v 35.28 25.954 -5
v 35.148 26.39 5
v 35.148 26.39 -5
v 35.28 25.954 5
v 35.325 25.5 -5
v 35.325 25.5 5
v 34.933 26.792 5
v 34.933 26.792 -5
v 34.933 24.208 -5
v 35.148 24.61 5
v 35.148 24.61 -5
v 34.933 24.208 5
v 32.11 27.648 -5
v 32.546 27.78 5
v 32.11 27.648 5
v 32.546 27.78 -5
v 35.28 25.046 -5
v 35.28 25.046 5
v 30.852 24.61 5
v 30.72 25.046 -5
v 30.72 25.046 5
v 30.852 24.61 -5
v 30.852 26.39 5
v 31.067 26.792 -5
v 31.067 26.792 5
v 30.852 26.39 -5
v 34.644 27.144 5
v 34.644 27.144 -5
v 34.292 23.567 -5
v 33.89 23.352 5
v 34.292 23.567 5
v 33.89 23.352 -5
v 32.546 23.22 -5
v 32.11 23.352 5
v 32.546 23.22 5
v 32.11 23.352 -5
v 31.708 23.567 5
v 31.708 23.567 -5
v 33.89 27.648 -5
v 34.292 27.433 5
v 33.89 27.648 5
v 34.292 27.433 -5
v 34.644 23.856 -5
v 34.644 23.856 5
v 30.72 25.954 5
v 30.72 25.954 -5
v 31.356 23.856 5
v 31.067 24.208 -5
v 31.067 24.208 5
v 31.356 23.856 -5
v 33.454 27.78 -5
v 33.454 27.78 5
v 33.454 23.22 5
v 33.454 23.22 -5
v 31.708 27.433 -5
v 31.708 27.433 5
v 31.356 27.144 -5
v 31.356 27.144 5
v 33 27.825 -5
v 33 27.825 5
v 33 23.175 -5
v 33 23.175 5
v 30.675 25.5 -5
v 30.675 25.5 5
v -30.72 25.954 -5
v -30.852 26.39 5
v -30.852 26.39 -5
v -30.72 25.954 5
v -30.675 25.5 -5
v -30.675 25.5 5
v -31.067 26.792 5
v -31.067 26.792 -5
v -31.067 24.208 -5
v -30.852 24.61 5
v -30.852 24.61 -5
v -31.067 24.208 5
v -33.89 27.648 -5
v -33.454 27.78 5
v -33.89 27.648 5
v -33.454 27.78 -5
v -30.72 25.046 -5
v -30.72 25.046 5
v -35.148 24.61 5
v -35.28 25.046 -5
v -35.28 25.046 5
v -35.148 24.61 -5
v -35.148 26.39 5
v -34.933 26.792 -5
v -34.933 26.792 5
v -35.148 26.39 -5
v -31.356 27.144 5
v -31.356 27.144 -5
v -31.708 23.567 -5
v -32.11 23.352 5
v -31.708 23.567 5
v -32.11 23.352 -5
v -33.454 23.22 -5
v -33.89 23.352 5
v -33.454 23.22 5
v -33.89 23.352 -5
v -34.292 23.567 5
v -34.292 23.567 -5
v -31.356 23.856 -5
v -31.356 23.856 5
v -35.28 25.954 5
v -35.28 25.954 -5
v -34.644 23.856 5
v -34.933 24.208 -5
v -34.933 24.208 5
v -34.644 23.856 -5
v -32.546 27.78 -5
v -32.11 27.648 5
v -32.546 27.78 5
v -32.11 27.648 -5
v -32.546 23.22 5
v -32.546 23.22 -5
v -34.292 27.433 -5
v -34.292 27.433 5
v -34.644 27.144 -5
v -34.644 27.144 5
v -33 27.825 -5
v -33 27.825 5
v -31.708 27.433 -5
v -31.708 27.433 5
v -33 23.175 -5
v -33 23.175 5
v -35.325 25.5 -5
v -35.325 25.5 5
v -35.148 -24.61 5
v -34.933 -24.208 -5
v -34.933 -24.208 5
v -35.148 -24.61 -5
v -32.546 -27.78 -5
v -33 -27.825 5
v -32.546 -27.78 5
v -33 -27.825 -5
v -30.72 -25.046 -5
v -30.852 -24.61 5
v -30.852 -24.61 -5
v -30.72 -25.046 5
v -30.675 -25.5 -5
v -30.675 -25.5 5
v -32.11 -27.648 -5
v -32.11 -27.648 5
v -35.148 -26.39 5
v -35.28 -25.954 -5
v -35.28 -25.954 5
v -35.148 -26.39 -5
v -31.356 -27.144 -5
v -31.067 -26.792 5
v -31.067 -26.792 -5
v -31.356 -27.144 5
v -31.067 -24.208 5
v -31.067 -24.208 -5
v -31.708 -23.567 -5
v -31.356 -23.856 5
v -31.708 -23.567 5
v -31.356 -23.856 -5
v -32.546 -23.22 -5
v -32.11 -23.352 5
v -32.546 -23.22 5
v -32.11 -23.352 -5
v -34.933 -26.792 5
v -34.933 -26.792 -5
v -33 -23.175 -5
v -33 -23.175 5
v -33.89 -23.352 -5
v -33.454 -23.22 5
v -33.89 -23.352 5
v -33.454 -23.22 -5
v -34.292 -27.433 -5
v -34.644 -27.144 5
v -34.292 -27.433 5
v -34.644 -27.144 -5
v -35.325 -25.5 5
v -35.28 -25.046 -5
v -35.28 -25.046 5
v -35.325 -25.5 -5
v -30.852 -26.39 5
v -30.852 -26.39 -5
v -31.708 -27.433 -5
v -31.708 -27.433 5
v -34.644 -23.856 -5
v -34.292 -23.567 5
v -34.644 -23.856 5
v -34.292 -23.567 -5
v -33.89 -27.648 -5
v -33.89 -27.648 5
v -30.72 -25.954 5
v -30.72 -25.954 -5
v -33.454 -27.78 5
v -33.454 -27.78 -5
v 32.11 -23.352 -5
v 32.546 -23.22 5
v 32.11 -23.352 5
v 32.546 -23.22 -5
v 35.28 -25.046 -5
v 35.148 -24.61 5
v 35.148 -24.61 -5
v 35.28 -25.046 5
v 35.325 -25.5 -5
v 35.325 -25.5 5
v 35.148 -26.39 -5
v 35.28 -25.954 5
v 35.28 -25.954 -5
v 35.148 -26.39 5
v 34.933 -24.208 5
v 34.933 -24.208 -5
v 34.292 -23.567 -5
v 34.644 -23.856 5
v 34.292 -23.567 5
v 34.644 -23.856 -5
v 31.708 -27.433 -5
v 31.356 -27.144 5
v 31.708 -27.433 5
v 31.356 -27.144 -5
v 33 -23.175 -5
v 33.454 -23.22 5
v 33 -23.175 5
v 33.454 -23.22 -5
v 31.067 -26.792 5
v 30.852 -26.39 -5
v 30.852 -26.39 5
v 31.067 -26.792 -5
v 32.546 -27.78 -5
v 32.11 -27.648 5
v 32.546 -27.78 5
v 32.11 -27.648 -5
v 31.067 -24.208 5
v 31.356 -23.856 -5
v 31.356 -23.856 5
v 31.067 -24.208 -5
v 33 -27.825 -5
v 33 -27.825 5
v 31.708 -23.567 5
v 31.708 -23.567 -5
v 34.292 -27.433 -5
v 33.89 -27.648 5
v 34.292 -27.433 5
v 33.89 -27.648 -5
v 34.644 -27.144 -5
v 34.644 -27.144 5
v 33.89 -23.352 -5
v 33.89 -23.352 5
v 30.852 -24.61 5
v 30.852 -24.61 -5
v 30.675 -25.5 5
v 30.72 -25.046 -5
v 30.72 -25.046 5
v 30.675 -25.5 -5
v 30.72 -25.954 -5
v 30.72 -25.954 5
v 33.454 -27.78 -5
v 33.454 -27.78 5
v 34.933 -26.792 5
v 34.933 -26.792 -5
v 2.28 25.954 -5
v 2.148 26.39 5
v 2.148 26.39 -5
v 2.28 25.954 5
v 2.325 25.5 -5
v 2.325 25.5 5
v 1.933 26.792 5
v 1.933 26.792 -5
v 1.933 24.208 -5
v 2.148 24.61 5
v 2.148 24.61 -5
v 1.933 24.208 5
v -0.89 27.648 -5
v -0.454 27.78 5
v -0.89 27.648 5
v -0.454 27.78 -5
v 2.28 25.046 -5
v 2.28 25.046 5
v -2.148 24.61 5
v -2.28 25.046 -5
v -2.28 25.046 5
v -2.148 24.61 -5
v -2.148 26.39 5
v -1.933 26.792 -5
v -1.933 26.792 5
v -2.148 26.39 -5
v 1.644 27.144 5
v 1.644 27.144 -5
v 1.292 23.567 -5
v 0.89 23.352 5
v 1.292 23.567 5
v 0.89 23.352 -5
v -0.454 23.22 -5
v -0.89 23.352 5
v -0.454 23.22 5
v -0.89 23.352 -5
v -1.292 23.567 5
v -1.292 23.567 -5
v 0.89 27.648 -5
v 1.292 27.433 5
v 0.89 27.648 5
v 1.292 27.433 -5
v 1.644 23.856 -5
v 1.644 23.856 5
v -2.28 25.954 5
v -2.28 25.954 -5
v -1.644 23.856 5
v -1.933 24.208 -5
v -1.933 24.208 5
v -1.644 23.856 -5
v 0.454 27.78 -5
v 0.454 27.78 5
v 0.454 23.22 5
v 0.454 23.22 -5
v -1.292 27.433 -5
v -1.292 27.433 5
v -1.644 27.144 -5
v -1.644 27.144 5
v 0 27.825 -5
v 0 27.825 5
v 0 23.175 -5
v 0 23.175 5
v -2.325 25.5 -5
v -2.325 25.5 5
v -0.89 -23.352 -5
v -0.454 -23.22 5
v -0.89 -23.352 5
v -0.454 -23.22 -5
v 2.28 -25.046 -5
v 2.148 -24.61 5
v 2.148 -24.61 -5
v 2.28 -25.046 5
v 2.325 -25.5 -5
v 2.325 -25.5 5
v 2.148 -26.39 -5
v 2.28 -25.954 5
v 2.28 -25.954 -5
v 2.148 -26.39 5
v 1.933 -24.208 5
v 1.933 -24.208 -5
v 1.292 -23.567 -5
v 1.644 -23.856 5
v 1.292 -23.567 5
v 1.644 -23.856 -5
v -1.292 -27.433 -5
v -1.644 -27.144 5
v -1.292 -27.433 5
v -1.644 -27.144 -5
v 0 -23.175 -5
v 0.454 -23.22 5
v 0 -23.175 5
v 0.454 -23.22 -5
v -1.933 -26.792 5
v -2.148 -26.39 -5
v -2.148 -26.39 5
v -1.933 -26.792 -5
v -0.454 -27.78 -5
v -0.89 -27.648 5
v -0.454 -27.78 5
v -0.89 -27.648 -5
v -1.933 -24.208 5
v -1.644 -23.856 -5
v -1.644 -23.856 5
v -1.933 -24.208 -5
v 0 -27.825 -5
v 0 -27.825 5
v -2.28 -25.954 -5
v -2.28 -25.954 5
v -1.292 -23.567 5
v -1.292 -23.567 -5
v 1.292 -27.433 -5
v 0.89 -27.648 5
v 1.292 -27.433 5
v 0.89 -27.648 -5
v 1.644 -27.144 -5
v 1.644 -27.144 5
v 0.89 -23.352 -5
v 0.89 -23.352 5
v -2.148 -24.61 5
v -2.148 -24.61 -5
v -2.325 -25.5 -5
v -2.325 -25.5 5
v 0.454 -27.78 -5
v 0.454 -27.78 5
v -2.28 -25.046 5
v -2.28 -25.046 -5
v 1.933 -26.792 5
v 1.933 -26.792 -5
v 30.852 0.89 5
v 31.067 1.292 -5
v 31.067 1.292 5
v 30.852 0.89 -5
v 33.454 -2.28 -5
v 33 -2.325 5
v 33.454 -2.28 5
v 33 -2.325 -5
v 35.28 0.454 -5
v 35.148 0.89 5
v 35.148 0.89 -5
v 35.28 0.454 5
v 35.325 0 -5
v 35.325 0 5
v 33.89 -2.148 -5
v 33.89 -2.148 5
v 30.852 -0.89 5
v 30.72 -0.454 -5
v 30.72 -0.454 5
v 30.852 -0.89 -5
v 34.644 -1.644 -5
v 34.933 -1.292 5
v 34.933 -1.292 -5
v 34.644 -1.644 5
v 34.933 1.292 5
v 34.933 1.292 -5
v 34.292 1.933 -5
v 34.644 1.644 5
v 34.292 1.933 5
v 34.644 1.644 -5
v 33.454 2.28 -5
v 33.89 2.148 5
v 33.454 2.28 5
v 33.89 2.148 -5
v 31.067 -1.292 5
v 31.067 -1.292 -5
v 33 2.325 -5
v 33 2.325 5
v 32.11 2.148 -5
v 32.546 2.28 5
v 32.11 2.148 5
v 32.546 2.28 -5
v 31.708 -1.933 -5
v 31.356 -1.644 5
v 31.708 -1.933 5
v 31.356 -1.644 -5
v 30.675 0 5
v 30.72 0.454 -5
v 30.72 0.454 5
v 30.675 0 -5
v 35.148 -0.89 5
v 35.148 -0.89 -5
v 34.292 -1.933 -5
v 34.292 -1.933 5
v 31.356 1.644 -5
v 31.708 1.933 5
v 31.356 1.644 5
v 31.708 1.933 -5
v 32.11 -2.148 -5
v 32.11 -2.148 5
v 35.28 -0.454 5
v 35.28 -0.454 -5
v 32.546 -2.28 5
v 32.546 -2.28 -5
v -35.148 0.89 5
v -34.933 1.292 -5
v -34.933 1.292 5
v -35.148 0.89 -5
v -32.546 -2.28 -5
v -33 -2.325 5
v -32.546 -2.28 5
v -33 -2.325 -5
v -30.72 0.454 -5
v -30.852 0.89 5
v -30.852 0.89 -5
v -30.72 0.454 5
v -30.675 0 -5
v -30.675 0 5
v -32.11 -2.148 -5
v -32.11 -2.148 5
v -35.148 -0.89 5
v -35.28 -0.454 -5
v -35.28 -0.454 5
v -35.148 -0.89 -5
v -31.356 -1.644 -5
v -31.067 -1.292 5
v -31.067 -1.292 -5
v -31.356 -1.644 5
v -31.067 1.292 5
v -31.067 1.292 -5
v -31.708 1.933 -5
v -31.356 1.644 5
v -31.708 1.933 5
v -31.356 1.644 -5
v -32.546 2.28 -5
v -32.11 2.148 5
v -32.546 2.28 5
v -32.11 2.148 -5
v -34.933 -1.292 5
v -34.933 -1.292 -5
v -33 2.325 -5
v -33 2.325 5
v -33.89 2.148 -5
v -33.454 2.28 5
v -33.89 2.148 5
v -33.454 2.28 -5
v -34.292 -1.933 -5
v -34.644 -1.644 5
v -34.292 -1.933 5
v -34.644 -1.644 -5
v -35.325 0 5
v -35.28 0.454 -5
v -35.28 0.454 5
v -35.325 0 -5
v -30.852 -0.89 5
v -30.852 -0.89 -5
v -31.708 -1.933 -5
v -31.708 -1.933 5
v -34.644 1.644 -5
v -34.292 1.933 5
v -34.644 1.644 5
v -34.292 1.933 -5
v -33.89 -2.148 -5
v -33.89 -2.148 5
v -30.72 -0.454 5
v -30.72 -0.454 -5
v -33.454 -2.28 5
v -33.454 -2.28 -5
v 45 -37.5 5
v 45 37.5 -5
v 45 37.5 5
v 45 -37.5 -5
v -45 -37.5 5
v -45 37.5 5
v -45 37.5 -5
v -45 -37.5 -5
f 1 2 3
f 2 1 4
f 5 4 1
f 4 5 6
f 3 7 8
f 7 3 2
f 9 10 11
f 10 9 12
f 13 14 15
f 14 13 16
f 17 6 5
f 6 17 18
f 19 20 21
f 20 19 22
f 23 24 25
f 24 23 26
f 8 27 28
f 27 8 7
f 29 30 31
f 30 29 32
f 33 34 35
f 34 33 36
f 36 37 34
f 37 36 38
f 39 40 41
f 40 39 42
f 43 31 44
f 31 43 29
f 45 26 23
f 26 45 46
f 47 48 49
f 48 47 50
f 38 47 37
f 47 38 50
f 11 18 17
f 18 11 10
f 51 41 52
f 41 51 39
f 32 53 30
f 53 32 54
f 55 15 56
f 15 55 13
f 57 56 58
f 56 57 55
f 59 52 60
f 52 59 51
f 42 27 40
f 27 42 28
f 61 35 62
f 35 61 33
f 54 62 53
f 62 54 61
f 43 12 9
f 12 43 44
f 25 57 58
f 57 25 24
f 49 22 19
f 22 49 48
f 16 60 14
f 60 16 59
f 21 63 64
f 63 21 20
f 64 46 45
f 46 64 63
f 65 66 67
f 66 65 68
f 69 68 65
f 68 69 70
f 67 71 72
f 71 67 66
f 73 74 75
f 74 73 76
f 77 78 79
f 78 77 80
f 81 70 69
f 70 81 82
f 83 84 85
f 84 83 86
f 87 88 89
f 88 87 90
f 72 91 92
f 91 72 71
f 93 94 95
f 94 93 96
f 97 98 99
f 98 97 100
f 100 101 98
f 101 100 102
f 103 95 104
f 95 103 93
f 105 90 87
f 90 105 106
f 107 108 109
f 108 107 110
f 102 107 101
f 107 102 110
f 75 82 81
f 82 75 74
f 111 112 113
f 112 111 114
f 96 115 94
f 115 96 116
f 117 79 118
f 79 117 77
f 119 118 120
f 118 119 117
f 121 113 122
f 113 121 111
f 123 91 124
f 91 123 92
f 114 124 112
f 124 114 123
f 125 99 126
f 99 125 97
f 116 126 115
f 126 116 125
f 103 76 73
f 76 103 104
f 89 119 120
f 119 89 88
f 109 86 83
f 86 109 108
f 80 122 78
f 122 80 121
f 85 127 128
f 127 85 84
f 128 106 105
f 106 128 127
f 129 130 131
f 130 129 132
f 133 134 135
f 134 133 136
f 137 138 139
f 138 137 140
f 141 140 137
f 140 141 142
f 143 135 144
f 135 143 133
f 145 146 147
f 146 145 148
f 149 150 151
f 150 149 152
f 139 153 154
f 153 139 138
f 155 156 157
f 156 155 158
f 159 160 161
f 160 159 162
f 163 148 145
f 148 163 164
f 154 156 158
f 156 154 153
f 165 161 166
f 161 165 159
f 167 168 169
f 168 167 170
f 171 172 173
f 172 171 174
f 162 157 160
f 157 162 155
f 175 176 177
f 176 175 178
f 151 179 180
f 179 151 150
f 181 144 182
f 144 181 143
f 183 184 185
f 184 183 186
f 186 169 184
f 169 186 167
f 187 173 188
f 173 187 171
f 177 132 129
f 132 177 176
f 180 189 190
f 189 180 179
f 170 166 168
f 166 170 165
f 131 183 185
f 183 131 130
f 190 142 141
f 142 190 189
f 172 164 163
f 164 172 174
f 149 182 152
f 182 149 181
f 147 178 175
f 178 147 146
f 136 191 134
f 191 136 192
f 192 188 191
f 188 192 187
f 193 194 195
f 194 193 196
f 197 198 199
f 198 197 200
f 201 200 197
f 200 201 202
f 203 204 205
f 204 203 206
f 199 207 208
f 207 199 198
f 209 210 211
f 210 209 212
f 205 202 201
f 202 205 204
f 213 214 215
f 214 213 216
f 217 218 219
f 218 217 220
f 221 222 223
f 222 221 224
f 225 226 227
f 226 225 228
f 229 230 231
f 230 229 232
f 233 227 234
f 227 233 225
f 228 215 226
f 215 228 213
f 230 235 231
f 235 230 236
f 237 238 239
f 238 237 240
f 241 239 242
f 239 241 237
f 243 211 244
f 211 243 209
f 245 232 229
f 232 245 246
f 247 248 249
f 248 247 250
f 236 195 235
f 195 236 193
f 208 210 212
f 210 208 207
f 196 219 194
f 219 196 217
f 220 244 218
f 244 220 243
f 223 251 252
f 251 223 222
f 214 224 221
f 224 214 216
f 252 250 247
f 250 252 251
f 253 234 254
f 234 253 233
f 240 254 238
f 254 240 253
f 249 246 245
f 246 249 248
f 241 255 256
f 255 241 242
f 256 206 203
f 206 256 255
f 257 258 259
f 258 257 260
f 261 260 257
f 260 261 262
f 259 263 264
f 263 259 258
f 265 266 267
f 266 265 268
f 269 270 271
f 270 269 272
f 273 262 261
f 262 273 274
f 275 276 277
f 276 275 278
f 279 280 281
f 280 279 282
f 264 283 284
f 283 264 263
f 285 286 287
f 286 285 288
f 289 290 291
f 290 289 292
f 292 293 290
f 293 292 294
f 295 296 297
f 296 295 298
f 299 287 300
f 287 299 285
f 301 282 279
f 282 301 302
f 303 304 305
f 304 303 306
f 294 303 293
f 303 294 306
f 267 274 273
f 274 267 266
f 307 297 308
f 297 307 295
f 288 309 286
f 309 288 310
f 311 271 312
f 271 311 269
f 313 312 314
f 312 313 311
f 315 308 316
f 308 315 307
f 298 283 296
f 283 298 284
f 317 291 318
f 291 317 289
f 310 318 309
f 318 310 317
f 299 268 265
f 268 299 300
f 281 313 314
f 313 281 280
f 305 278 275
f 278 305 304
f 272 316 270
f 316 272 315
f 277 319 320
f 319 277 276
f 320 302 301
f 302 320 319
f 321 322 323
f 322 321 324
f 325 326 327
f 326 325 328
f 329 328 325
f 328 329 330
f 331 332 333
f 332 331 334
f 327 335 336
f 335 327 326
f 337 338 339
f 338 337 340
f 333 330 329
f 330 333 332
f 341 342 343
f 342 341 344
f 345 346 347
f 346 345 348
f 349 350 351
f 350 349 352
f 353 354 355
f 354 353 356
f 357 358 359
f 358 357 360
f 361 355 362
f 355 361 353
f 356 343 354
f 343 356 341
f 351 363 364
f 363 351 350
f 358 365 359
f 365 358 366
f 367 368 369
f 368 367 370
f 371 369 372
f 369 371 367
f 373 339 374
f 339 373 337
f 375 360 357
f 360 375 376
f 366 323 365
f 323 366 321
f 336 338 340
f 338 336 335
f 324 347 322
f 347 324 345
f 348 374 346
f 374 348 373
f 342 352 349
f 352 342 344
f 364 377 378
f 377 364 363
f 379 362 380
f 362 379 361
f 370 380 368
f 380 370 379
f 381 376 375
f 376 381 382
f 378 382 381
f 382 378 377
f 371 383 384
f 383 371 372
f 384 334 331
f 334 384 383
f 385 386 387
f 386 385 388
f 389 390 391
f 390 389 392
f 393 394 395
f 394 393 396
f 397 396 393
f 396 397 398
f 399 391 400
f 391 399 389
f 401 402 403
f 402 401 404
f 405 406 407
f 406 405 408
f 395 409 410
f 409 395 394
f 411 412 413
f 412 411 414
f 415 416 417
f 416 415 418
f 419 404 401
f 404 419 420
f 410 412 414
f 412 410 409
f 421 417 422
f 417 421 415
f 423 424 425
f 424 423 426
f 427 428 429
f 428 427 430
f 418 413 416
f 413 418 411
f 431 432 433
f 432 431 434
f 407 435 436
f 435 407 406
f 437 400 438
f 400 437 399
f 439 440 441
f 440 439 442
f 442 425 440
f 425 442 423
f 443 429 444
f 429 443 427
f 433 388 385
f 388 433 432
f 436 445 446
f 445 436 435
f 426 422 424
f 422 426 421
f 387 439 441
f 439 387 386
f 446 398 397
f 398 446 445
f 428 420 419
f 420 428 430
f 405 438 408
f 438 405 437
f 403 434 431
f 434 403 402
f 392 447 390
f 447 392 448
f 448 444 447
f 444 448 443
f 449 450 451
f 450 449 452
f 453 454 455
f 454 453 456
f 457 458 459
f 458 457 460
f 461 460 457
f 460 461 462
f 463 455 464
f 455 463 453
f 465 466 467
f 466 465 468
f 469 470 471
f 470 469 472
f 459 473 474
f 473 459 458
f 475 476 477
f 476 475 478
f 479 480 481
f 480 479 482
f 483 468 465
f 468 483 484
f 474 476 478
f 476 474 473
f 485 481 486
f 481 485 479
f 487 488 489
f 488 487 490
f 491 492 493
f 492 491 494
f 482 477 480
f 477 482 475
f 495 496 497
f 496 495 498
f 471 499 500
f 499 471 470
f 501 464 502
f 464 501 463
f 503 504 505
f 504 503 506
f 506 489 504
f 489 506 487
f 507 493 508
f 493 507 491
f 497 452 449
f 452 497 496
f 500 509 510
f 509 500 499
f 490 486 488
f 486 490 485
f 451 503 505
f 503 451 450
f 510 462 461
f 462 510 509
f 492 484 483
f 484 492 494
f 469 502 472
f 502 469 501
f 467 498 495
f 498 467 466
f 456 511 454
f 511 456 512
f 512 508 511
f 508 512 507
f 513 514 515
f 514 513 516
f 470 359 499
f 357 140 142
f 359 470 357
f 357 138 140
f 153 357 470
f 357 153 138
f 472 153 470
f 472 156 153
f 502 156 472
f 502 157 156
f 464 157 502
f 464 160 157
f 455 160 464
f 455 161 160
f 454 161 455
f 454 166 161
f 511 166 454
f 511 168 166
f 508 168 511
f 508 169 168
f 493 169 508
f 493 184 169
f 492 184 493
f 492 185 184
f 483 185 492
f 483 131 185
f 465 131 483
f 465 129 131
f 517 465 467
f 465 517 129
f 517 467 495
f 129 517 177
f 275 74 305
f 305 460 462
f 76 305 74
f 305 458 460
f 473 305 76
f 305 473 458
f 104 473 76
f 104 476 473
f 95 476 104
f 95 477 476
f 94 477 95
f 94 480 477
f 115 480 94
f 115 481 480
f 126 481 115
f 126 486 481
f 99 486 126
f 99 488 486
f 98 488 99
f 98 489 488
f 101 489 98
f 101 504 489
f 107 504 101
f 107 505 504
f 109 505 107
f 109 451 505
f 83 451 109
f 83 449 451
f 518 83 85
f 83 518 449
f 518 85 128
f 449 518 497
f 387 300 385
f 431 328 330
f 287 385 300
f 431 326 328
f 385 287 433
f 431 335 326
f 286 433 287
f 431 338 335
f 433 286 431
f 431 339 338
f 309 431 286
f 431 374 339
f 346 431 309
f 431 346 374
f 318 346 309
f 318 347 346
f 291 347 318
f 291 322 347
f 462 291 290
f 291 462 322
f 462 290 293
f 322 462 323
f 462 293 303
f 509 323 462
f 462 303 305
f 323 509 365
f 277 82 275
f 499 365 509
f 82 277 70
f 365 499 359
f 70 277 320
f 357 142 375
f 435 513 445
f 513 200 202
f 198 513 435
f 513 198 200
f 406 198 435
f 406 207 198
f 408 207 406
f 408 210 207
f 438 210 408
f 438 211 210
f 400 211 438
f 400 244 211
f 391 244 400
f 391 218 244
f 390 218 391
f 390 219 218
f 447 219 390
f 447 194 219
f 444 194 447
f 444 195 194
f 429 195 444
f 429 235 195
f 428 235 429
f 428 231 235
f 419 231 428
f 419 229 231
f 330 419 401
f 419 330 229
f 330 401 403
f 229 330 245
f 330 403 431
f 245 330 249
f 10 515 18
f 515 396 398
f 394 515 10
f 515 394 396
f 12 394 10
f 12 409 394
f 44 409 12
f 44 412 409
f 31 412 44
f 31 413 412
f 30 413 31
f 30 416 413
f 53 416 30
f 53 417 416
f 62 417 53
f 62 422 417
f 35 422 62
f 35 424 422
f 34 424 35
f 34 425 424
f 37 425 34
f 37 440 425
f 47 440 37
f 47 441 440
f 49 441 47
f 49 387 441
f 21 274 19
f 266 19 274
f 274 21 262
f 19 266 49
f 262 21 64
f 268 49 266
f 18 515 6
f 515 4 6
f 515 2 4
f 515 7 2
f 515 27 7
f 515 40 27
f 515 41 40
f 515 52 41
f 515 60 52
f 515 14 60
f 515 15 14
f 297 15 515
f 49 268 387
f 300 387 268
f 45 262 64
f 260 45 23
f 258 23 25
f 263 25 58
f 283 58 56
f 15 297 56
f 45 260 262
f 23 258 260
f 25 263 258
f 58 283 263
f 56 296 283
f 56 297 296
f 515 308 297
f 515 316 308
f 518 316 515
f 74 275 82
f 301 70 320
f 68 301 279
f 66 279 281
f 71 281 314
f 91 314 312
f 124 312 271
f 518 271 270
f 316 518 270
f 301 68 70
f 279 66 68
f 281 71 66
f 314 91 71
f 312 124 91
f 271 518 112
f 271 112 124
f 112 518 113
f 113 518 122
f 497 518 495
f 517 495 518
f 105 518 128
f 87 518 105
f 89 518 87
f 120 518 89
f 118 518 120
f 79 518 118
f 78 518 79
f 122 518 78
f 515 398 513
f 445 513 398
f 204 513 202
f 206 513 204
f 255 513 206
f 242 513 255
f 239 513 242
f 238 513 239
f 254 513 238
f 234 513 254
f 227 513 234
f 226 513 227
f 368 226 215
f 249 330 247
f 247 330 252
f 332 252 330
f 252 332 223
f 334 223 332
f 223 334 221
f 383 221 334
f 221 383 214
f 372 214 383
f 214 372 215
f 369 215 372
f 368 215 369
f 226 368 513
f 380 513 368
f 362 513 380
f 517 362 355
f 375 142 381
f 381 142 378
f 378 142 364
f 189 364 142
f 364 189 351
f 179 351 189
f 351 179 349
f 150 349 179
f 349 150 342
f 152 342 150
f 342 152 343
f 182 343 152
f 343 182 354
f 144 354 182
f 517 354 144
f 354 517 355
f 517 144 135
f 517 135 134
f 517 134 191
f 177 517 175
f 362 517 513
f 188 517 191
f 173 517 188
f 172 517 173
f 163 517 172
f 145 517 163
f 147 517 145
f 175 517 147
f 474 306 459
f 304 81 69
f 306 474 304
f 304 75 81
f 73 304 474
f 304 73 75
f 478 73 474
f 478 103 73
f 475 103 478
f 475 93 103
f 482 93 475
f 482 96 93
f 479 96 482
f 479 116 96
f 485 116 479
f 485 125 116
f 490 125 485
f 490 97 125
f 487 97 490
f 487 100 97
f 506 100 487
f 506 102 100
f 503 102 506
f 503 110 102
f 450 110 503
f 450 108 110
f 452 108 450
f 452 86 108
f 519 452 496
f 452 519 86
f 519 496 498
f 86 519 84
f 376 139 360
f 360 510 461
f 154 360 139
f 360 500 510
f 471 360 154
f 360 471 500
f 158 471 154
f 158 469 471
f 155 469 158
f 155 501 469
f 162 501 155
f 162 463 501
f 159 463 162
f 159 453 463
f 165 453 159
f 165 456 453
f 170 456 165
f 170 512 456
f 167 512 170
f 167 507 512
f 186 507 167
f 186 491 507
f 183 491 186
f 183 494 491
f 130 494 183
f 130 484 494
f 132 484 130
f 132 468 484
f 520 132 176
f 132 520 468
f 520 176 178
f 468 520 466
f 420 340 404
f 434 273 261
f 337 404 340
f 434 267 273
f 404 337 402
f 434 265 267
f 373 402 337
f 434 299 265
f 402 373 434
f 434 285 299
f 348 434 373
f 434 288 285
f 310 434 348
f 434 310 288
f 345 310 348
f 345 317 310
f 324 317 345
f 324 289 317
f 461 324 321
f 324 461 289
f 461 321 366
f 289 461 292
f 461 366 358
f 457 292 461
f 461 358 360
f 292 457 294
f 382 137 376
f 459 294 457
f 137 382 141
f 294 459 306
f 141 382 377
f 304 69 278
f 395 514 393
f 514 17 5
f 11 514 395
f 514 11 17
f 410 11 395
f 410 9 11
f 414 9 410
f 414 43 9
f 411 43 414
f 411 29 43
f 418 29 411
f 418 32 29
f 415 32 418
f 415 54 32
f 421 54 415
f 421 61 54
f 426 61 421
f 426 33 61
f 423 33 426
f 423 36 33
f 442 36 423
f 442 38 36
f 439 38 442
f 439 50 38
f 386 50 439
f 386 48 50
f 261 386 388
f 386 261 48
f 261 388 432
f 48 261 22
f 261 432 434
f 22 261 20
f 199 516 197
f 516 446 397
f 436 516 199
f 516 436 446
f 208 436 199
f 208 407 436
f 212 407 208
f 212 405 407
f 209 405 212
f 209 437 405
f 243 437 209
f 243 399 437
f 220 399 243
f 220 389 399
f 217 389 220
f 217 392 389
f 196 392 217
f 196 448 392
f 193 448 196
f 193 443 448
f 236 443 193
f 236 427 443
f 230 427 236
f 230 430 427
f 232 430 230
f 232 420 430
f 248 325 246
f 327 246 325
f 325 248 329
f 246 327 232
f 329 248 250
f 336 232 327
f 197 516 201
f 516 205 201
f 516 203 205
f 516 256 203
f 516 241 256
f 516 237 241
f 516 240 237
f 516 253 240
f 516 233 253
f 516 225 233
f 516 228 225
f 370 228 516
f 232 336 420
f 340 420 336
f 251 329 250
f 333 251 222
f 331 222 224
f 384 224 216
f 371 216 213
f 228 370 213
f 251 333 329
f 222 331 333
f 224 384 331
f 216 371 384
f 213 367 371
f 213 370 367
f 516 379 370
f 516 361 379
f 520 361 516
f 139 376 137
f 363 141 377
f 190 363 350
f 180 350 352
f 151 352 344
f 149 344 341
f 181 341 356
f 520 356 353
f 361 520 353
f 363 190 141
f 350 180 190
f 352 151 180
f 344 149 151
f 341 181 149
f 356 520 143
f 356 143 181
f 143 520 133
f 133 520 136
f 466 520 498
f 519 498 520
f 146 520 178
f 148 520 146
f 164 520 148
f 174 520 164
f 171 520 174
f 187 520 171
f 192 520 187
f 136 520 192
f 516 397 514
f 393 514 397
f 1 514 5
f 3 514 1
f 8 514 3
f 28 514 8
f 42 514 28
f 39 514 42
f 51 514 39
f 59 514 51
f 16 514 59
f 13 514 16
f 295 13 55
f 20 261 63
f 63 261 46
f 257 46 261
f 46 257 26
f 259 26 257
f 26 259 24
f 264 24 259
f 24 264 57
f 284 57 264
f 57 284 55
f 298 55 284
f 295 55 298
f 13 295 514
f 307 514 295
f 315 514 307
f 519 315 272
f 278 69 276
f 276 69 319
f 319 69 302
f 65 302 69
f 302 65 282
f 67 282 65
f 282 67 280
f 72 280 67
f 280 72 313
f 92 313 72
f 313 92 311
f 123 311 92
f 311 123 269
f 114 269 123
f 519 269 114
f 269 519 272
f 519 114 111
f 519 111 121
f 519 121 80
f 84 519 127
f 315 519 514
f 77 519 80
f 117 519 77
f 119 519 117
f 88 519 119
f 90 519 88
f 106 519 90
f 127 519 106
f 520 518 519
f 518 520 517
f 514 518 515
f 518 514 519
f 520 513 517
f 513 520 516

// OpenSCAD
$fn = 32;

// ----------------------------------------------------------------------
// Corner plate 90 x 75 x 10
// 8 holes, centres taken from the edge offset
// ----------------------------------------------------------------------

// --- parameters (mm) ---
plate = [90, 75, 10];    // overall size (x, y, z)
holes = 8;               // number of holes the drawing asks for
bore_d = 4.5;            // nominal hole diameter from the drawing
print_allowance = 0.15;  // clearance added for printing
edge = 12;               // hole centre offset from the plate edge

// --- derived feature positions (mm) ---
hole_d = bore_d + print_allowance;  // = 4.65   hole diameter as printed
corner_x = plate[0] / 2 - edge;     // = 33   corner hole X
corner_y = plate[1] / 2 - edge;     // = 25.5   corner hole Y
feature_centers = [
  [corner_x, corner_y],
  [-corner_x, corner_y],
  [-corner_x, -corner_y],
  [corner_x, -corner_y],
  [0, corner_y],
  [0, -corner_y],
  [corner_x, 0],
  [-corner_x, 0]
];   // hole centres the loop below drills

// plate outline, every hole drilled through with the same cutters
difference() {
  cube(plate, center = true);
  for (centre = feature_centers)
    translate([centre[0], centre[1], 0])
      cylinder(d = hole_d, h = plate[2] + 2, center = true);
}
